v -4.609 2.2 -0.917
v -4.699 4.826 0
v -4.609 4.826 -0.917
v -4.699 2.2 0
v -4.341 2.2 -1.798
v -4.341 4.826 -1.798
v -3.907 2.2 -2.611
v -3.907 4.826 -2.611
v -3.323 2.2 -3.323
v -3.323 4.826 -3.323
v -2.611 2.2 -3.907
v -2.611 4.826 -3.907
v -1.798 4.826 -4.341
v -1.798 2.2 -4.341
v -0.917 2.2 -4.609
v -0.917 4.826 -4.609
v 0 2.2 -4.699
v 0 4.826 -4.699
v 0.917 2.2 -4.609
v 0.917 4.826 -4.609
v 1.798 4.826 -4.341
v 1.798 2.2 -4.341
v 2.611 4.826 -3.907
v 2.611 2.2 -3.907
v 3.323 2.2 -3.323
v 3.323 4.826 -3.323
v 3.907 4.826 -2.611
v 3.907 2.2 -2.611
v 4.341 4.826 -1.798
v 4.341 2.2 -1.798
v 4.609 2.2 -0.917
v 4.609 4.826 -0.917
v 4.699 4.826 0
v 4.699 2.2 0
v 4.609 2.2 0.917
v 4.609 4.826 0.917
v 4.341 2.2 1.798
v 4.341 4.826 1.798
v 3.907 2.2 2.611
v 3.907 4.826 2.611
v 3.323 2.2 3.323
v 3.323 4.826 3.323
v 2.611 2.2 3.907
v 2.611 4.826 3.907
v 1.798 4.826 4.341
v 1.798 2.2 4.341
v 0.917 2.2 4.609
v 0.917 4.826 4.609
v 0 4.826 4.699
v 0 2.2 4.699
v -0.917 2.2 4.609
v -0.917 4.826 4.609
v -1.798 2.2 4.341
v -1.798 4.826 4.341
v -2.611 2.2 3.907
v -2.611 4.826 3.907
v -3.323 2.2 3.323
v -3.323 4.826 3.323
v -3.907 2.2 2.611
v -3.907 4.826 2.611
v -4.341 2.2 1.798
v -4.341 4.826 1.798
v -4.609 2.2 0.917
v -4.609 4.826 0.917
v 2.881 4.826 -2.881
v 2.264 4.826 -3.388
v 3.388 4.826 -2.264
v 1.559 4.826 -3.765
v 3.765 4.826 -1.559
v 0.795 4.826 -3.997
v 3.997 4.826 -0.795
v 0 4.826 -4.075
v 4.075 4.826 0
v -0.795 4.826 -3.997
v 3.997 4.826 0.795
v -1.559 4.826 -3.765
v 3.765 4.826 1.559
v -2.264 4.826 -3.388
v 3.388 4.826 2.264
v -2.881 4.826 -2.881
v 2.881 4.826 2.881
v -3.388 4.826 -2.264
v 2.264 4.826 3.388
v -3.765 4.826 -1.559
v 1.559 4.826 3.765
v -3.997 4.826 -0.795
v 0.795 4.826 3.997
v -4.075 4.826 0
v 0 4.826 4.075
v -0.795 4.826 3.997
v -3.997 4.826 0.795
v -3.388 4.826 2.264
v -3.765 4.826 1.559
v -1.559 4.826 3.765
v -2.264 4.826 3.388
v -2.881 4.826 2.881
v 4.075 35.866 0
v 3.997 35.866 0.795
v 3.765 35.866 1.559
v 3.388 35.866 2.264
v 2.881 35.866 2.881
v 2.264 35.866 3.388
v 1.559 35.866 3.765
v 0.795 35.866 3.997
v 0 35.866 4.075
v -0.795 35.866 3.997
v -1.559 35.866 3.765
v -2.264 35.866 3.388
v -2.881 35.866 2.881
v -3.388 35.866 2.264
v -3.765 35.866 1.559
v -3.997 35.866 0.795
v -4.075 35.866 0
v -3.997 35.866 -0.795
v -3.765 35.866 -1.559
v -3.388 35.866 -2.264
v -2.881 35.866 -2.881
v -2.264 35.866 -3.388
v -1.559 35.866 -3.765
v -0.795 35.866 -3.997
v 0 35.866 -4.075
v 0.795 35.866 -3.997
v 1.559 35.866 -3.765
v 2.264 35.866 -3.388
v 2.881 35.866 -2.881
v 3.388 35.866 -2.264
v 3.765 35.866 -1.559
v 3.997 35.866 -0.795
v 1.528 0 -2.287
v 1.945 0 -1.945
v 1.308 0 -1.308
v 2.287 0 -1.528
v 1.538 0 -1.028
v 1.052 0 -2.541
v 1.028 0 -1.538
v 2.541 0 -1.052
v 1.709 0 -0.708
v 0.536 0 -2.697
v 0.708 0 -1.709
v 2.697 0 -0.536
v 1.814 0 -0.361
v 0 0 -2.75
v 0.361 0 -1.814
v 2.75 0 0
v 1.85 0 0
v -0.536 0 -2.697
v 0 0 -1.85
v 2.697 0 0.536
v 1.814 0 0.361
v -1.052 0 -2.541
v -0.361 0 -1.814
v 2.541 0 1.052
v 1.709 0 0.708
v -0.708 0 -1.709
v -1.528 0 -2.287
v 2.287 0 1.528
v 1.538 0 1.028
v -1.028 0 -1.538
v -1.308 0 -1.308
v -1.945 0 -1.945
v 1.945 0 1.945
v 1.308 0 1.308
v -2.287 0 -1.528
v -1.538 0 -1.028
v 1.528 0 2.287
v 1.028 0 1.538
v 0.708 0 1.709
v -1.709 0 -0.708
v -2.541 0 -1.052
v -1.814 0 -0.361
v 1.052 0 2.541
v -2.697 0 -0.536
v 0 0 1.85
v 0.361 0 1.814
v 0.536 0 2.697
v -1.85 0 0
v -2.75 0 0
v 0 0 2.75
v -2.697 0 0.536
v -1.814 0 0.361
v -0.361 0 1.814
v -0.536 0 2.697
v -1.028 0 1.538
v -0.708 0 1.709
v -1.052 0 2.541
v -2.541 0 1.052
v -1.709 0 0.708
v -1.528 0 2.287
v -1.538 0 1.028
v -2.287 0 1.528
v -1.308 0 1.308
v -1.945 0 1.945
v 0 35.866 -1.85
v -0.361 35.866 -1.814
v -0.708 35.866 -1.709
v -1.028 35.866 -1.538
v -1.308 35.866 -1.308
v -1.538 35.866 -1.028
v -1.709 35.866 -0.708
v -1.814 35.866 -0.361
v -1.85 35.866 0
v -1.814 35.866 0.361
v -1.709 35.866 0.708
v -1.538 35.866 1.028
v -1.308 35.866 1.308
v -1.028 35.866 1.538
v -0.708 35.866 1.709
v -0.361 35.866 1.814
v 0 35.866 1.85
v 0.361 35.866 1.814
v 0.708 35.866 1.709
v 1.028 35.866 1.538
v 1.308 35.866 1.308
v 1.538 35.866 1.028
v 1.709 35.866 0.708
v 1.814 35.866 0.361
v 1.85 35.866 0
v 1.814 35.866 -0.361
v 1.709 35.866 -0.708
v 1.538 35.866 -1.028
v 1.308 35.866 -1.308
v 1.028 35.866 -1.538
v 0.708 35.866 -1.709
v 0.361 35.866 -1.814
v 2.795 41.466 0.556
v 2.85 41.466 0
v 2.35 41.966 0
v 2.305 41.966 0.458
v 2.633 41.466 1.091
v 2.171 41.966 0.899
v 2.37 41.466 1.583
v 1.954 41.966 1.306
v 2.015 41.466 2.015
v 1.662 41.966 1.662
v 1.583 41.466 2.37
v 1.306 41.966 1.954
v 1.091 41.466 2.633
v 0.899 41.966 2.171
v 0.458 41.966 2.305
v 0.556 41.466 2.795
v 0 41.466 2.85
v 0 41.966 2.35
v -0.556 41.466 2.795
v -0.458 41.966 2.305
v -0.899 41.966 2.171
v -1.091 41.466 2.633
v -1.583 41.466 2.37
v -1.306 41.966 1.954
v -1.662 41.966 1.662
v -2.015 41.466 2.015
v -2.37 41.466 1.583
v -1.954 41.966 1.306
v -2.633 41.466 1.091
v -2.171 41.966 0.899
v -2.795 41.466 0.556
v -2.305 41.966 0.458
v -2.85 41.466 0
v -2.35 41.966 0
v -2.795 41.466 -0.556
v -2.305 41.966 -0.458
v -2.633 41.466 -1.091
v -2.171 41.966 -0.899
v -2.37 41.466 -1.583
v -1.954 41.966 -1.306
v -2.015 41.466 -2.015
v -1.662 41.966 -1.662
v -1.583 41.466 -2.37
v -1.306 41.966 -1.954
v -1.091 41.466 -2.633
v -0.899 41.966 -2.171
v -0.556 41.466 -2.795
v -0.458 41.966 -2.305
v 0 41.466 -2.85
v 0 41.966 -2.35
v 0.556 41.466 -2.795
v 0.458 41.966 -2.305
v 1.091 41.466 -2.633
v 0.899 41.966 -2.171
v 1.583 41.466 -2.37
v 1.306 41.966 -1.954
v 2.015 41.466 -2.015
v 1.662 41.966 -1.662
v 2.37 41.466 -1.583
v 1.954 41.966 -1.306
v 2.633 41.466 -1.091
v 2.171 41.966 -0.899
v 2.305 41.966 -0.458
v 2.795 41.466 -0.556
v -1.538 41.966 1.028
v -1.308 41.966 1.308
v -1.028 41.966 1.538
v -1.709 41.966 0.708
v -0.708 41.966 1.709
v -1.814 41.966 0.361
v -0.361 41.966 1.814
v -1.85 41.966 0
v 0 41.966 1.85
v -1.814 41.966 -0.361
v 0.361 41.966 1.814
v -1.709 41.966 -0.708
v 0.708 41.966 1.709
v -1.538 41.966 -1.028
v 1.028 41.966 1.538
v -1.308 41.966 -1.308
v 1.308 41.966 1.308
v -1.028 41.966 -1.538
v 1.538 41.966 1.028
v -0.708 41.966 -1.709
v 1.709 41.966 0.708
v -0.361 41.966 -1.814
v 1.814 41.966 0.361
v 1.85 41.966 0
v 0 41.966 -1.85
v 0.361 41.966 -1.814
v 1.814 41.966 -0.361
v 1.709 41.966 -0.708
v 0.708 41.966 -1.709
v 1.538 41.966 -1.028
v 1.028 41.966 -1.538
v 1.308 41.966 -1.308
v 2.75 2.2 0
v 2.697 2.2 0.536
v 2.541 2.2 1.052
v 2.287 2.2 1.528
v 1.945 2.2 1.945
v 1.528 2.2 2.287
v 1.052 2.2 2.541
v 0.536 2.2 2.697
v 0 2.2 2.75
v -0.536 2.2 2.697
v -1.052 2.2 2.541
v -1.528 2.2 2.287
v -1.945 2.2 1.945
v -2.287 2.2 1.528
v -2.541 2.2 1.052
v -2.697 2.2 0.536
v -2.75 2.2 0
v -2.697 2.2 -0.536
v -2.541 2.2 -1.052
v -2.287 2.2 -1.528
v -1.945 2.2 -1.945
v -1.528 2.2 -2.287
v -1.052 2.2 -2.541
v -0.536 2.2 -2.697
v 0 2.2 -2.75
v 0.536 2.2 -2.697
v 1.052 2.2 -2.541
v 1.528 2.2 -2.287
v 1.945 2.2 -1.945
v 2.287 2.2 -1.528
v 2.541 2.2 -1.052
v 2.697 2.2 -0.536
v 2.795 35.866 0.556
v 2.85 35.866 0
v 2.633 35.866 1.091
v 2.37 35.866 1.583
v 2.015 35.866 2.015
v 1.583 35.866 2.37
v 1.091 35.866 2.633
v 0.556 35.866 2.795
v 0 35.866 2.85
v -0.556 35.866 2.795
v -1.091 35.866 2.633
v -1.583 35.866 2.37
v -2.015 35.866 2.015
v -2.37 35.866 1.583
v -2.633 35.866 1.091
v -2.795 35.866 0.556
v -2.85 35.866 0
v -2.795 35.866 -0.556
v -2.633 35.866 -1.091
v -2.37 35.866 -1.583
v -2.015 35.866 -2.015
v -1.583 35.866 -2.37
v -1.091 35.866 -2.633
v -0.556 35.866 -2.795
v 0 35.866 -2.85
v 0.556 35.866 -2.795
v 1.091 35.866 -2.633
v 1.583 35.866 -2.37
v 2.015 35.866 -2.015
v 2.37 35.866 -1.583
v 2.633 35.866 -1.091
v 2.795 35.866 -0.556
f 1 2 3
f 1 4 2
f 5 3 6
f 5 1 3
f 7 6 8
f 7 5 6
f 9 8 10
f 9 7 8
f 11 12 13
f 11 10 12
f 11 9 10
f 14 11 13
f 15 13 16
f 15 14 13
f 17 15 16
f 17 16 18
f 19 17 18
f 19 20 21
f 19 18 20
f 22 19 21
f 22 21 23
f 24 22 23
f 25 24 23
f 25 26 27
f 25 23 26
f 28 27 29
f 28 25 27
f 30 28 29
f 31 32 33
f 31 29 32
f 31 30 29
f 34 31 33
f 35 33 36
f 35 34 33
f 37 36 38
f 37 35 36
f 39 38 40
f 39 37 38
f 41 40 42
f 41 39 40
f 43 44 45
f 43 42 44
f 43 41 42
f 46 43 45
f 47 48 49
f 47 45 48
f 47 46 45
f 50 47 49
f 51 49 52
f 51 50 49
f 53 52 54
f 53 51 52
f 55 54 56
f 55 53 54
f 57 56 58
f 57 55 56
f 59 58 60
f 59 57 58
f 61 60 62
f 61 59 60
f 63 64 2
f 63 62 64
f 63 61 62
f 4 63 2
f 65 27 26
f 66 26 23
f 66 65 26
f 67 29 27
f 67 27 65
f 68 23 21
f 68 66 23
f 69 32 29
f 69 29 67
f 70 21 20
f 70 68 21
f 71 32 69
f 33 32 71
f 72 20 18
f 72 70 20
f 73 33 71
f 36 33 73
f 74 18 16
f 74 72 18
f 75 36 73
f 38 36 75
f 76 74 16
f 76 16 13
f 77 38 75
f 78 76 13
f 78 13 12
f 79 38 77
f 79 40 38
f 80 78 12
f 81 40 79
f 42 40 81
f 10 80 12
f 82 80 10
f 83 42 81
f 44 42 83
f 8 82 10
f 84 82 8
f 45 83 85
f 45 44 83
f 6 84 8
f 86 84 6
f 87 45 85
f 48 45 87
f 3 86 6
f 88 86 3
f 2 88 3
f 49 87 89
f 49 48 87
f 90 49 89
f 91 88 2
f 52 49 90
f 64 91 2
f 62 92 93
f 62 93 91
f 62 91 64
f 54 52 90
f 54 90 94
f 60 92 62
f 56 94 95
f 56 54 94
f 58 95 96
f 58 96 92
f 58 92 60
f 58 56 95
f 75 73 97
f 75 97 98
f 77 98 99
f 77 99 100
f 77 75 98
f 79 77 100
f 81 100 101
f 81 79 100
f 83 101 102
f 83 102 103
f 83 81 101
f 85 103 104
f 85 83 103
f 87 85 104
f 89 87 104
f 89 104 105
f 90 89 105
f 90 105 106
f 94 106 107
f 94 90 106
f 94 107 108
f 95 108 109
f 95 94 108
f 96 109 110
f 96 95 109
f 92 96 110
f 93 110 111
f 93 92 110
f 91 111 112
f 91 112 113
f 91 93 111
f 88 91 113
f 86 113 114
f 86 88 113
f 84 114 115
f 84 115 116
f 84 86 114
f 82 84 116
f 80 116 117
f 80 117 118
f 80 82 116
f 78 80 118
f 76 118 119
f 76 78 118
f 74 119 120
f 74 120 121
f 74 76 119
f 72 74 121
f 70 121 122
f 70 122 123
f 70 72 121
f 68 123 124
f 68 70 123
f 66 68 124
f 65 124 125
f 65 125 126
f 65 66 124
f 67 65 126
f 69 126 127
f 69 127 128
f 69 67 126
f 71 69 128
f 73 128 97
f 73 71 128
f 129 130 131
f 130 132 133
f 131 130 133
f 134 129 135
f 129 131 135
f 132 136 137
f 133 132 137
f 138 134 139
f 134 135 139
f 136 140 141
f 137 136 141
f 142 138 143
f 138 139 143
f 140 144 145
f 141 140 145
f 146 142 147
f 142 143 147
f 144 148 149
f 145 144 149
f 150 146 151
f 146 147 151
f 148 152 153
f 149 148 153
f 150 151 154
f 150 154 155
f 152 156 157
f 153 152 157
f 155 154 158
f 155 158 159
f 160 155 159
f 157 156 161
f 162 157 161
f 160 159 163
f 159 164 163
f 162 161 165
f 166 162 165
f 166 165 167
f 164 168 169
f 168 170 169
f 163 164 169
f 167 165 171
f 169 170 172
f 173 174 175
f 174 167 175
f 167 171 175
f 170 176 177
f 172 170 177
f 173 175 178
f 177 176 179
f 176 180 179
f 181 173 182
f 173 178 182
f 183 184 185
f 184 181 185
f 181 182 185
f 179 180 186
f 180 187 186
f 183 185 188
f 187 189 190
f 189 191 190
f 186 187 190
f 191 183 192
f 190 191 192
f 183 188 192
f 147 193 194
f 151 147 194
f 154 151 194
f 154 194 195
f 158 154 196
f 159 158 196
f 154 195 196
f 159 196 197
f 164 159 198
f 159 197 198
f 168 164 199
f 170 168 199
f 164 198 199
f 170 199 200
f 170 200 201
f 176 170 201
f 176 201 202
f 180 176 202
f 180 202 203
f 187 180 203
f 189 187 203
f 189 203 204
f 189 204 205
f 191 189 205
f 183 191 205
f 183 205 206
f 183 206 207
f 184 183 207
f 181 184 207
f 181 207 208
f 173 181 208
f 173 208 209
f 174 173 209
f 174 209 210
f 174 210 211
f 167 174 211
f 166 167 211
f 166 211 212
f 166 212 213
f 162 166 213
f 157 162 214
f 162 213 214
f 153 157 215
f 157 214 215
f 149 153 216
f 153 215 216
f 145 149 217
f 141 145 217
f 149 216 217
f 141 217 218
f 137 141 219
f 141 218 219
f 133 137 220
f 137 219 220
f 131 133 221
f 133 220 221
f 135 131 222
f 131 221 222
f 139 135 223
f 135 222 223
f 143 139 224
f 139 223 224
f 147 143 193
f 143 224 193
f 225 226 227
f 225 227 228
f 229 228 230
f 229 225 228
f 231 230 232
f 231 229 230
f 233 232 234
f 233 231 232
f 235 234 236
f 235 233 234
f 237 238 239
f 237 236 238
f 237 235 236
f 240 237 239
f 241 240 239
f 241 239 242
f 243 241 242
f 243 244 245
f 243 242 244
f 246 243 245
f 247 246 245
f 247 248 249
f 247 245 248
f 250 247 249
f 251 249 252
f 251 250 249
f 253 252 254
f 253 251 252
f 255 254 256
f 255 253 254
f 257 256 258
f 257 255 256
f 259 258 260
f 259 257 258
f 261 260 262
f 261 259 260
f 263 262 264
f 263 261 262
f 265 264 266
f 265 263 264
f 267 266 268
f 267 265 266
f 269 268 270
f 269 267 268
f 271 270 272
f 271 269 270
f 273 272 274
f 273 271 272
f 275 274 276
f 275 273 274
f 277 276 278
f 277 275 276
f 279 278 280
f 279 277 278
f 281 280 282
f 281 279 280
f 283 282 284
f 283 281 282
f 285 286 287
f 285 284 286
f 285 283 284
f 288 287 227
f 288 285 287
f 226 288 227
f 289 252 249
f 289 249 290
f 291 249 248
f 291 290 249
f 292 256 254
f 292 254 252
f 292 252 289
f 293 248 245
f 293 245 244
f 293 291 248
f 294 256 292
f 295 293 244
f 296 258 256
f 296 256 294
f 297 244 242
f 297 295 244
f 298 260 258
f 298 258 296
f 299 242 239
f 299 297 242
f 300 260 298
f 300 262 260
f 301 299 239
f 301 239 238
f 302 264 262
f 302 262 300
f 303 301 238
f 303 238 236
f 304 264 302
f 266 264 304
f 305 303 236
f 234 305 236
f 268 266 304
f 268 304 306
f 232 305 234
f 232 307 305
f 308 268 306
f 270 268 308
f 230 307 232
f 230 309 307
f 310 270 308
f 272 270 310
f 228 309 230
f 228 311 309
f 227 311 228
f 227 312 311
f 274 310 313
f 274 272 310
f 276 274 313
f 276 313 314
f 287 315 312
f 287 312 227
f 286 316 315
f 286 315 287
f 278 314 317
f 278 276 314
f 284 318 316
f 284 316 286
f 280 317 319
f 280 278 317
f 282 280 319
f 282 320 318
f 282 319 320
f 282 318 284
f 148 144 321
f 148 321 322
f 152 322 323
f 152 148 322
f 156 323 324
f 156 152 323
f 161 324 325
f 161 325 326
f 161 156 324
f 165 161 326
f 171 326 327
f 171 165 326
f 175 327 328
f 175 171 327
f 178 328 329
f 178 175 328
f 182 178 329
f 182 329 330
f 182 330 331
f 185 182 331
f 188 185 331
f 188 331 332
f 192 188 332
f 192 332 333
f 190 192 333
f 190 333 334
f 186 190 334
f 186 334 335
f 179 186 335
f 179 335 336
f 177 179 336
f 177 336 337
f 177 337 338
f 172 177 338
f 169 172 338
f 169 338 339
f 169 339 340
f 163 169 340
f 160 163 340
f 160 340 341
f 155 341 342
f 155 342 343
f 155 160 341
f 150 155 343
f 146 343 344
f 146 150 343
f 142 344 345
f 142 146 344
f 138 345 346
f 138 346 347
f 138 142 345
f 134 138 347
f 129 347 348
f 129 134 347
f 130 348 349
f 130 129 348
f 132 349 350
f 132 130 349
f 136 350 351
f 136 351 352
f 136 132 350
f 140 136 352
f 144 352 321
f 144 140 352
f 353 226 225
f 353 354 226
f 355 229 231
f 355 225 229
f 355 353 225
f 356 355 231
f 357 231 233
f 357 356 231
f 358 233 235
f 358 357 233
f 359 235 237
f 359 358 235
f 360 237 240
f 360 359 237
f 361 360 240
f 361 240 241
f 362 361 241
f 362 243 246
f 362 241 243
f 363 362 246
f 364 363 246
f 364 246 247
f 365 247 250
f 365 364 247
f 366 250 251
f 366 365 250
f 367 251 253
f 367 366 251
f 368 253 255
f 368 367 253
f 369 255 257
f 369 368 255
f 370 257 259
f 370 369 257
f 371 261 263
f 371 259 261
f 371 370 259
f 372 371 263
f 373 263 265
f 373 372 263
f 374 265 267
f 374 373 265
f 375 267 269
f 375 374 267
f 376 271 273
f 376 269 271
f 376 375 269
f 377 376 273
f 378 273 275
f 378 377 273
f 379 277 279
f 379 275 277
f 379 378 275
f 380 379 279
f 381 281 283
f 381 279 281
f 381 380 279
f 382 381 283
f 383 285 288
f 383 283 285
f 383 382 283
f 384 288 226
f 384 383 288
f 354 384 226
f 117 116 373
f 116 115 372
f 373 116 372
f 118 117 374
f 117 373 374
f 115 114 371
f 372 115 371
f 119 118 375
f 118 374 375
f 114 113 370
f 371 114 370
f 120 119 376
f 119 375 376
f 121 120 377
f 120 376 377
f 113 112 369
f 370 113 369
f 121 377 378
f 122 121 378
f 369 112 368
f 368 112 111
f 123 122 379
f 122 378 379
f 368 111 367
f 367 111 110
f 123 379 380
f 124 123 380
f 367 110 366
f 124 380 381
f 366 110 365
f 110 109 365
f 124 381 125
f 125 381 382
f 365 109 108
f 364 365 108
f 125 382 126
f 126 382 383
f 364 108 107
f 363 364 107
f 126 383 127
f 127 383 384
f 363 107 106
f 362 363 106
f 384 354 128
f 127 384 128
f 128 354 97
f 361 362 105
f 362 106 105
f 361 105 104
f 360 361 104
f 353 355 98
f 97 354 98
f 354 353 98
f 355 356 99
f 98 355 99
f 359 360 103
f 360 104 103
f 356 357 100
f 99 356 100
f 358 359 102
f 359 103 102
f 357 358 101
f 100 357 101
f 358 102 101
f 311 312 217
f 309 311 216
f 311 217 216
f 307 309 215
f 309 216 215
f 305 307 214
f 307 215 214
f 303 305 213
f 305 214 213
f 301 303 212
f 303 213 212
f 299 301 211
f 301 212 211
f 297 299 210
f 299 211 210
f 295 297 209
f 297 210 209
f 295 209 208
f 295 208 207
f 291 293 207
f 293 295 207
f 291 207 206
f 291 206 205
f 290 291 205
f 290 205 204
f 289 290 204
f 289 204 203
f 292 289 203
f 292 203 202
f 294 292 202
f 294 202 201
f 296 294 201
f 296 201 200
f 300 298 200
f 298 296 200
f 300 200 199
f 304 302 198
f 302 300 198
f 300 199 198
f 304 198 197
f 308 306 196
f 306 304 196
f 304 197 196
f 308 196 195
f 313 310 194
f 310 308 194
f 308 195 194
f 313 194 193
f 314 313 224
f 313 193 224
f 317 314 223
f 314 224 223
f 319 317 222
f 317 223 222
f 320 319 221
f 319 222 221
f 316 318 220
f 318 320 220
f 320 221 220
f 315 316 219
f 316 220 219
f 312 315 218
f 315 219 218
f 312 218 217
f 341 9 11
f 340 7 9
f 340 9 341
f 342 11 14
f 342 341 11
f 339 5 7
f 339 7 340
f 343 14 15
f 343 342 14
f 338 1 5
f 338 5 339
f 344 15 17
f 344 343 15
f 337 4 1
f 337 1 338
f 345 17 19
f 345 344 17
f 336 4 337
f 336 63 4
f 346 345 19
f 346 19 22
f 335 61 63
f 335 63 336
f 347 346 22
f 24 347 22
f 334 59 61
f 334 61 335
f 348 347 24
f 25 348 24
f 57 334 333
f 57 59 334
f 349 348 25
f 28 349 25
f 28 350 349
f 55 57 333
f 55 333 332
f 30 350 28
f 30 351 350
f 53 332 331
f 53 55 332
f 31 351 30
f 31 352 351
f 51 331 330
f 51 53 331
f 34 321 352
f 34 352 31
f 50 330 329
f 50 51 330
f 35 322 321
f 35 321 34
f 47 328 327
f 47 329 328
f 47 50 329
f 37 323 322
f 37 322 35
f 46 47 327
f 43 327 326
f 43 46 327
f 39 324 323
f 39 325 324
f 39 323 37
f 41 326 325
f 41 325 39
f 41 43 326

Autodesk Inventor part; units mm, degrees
ref_plane "YZ Plane" through (0, 0, 0) normal (1, 0, 0) x (0, 1, 0)
ref_plane "XZ Plane" through (0, 0, 0) normal (0, 1, 0) x (-1, 0, 0)
ref_plane "XY Plane" through (0, 0, 0) normal (0, 0, 1) x (1, 0, 0)
sketch "Sketch1" plane through (0, 0, 0) normal (0, 1, 0) x (-1, 0, 0)
  circle A0 centre (0, 0) radius 4.699
  dimension "d0" = 9.398
extrude "Extrusion1" add sketch "Sketch1" along normal blind 4.826
sketch "Sketch2" plane through (0, 0, 0) normal (0, -1, 0) x (1, 0, 0)
  circle A0 centre (0, 0) radius 4.075
  dimension "d3" = 8.15
extrude "Extrusion2" add sketch "Sketch2" against normal blind 35.866
sketch "Sketch3" plane through (0, 0, 0) normal (0, -1, 0) x (1, 0, 0)
  circle A0 centre (0, 0) radius 4.699 projected
  circle A1 centre (0, 0) radius 2.75
  dimension "d18" = 5.5
extrude "Extrusion3" cut sketch "Sketch3" against normal blind 2.2
sketch "Sketch5" plane through (0, 0, 0) normal (0, -1, 0) x (1, 0, 0)
  circle A0 centre (0, 0) radius 2.75 projected
hole "Hole2" at (0, 0, 0) direction (0, 1, 0) diameter 3.7 end through all
sketch "Sketch6" plane through (0, 35.866, 0) normal (0, 1, 0) x (1, 0, 0)
  circle A0 centre (0, 0) radius 1.85 projected
  circle A1 centre (0, 0) radius 2.85
  dimension "d29" = 5.7
extrude "Extrusion4" add sketch "Sketch6" along normal blind 6.1
chamfer "Chamfer3" distance 0.5 angle 45 1 edges at (-2.85, 41.966, 0)
properties part number "Hour shaft test 7"
